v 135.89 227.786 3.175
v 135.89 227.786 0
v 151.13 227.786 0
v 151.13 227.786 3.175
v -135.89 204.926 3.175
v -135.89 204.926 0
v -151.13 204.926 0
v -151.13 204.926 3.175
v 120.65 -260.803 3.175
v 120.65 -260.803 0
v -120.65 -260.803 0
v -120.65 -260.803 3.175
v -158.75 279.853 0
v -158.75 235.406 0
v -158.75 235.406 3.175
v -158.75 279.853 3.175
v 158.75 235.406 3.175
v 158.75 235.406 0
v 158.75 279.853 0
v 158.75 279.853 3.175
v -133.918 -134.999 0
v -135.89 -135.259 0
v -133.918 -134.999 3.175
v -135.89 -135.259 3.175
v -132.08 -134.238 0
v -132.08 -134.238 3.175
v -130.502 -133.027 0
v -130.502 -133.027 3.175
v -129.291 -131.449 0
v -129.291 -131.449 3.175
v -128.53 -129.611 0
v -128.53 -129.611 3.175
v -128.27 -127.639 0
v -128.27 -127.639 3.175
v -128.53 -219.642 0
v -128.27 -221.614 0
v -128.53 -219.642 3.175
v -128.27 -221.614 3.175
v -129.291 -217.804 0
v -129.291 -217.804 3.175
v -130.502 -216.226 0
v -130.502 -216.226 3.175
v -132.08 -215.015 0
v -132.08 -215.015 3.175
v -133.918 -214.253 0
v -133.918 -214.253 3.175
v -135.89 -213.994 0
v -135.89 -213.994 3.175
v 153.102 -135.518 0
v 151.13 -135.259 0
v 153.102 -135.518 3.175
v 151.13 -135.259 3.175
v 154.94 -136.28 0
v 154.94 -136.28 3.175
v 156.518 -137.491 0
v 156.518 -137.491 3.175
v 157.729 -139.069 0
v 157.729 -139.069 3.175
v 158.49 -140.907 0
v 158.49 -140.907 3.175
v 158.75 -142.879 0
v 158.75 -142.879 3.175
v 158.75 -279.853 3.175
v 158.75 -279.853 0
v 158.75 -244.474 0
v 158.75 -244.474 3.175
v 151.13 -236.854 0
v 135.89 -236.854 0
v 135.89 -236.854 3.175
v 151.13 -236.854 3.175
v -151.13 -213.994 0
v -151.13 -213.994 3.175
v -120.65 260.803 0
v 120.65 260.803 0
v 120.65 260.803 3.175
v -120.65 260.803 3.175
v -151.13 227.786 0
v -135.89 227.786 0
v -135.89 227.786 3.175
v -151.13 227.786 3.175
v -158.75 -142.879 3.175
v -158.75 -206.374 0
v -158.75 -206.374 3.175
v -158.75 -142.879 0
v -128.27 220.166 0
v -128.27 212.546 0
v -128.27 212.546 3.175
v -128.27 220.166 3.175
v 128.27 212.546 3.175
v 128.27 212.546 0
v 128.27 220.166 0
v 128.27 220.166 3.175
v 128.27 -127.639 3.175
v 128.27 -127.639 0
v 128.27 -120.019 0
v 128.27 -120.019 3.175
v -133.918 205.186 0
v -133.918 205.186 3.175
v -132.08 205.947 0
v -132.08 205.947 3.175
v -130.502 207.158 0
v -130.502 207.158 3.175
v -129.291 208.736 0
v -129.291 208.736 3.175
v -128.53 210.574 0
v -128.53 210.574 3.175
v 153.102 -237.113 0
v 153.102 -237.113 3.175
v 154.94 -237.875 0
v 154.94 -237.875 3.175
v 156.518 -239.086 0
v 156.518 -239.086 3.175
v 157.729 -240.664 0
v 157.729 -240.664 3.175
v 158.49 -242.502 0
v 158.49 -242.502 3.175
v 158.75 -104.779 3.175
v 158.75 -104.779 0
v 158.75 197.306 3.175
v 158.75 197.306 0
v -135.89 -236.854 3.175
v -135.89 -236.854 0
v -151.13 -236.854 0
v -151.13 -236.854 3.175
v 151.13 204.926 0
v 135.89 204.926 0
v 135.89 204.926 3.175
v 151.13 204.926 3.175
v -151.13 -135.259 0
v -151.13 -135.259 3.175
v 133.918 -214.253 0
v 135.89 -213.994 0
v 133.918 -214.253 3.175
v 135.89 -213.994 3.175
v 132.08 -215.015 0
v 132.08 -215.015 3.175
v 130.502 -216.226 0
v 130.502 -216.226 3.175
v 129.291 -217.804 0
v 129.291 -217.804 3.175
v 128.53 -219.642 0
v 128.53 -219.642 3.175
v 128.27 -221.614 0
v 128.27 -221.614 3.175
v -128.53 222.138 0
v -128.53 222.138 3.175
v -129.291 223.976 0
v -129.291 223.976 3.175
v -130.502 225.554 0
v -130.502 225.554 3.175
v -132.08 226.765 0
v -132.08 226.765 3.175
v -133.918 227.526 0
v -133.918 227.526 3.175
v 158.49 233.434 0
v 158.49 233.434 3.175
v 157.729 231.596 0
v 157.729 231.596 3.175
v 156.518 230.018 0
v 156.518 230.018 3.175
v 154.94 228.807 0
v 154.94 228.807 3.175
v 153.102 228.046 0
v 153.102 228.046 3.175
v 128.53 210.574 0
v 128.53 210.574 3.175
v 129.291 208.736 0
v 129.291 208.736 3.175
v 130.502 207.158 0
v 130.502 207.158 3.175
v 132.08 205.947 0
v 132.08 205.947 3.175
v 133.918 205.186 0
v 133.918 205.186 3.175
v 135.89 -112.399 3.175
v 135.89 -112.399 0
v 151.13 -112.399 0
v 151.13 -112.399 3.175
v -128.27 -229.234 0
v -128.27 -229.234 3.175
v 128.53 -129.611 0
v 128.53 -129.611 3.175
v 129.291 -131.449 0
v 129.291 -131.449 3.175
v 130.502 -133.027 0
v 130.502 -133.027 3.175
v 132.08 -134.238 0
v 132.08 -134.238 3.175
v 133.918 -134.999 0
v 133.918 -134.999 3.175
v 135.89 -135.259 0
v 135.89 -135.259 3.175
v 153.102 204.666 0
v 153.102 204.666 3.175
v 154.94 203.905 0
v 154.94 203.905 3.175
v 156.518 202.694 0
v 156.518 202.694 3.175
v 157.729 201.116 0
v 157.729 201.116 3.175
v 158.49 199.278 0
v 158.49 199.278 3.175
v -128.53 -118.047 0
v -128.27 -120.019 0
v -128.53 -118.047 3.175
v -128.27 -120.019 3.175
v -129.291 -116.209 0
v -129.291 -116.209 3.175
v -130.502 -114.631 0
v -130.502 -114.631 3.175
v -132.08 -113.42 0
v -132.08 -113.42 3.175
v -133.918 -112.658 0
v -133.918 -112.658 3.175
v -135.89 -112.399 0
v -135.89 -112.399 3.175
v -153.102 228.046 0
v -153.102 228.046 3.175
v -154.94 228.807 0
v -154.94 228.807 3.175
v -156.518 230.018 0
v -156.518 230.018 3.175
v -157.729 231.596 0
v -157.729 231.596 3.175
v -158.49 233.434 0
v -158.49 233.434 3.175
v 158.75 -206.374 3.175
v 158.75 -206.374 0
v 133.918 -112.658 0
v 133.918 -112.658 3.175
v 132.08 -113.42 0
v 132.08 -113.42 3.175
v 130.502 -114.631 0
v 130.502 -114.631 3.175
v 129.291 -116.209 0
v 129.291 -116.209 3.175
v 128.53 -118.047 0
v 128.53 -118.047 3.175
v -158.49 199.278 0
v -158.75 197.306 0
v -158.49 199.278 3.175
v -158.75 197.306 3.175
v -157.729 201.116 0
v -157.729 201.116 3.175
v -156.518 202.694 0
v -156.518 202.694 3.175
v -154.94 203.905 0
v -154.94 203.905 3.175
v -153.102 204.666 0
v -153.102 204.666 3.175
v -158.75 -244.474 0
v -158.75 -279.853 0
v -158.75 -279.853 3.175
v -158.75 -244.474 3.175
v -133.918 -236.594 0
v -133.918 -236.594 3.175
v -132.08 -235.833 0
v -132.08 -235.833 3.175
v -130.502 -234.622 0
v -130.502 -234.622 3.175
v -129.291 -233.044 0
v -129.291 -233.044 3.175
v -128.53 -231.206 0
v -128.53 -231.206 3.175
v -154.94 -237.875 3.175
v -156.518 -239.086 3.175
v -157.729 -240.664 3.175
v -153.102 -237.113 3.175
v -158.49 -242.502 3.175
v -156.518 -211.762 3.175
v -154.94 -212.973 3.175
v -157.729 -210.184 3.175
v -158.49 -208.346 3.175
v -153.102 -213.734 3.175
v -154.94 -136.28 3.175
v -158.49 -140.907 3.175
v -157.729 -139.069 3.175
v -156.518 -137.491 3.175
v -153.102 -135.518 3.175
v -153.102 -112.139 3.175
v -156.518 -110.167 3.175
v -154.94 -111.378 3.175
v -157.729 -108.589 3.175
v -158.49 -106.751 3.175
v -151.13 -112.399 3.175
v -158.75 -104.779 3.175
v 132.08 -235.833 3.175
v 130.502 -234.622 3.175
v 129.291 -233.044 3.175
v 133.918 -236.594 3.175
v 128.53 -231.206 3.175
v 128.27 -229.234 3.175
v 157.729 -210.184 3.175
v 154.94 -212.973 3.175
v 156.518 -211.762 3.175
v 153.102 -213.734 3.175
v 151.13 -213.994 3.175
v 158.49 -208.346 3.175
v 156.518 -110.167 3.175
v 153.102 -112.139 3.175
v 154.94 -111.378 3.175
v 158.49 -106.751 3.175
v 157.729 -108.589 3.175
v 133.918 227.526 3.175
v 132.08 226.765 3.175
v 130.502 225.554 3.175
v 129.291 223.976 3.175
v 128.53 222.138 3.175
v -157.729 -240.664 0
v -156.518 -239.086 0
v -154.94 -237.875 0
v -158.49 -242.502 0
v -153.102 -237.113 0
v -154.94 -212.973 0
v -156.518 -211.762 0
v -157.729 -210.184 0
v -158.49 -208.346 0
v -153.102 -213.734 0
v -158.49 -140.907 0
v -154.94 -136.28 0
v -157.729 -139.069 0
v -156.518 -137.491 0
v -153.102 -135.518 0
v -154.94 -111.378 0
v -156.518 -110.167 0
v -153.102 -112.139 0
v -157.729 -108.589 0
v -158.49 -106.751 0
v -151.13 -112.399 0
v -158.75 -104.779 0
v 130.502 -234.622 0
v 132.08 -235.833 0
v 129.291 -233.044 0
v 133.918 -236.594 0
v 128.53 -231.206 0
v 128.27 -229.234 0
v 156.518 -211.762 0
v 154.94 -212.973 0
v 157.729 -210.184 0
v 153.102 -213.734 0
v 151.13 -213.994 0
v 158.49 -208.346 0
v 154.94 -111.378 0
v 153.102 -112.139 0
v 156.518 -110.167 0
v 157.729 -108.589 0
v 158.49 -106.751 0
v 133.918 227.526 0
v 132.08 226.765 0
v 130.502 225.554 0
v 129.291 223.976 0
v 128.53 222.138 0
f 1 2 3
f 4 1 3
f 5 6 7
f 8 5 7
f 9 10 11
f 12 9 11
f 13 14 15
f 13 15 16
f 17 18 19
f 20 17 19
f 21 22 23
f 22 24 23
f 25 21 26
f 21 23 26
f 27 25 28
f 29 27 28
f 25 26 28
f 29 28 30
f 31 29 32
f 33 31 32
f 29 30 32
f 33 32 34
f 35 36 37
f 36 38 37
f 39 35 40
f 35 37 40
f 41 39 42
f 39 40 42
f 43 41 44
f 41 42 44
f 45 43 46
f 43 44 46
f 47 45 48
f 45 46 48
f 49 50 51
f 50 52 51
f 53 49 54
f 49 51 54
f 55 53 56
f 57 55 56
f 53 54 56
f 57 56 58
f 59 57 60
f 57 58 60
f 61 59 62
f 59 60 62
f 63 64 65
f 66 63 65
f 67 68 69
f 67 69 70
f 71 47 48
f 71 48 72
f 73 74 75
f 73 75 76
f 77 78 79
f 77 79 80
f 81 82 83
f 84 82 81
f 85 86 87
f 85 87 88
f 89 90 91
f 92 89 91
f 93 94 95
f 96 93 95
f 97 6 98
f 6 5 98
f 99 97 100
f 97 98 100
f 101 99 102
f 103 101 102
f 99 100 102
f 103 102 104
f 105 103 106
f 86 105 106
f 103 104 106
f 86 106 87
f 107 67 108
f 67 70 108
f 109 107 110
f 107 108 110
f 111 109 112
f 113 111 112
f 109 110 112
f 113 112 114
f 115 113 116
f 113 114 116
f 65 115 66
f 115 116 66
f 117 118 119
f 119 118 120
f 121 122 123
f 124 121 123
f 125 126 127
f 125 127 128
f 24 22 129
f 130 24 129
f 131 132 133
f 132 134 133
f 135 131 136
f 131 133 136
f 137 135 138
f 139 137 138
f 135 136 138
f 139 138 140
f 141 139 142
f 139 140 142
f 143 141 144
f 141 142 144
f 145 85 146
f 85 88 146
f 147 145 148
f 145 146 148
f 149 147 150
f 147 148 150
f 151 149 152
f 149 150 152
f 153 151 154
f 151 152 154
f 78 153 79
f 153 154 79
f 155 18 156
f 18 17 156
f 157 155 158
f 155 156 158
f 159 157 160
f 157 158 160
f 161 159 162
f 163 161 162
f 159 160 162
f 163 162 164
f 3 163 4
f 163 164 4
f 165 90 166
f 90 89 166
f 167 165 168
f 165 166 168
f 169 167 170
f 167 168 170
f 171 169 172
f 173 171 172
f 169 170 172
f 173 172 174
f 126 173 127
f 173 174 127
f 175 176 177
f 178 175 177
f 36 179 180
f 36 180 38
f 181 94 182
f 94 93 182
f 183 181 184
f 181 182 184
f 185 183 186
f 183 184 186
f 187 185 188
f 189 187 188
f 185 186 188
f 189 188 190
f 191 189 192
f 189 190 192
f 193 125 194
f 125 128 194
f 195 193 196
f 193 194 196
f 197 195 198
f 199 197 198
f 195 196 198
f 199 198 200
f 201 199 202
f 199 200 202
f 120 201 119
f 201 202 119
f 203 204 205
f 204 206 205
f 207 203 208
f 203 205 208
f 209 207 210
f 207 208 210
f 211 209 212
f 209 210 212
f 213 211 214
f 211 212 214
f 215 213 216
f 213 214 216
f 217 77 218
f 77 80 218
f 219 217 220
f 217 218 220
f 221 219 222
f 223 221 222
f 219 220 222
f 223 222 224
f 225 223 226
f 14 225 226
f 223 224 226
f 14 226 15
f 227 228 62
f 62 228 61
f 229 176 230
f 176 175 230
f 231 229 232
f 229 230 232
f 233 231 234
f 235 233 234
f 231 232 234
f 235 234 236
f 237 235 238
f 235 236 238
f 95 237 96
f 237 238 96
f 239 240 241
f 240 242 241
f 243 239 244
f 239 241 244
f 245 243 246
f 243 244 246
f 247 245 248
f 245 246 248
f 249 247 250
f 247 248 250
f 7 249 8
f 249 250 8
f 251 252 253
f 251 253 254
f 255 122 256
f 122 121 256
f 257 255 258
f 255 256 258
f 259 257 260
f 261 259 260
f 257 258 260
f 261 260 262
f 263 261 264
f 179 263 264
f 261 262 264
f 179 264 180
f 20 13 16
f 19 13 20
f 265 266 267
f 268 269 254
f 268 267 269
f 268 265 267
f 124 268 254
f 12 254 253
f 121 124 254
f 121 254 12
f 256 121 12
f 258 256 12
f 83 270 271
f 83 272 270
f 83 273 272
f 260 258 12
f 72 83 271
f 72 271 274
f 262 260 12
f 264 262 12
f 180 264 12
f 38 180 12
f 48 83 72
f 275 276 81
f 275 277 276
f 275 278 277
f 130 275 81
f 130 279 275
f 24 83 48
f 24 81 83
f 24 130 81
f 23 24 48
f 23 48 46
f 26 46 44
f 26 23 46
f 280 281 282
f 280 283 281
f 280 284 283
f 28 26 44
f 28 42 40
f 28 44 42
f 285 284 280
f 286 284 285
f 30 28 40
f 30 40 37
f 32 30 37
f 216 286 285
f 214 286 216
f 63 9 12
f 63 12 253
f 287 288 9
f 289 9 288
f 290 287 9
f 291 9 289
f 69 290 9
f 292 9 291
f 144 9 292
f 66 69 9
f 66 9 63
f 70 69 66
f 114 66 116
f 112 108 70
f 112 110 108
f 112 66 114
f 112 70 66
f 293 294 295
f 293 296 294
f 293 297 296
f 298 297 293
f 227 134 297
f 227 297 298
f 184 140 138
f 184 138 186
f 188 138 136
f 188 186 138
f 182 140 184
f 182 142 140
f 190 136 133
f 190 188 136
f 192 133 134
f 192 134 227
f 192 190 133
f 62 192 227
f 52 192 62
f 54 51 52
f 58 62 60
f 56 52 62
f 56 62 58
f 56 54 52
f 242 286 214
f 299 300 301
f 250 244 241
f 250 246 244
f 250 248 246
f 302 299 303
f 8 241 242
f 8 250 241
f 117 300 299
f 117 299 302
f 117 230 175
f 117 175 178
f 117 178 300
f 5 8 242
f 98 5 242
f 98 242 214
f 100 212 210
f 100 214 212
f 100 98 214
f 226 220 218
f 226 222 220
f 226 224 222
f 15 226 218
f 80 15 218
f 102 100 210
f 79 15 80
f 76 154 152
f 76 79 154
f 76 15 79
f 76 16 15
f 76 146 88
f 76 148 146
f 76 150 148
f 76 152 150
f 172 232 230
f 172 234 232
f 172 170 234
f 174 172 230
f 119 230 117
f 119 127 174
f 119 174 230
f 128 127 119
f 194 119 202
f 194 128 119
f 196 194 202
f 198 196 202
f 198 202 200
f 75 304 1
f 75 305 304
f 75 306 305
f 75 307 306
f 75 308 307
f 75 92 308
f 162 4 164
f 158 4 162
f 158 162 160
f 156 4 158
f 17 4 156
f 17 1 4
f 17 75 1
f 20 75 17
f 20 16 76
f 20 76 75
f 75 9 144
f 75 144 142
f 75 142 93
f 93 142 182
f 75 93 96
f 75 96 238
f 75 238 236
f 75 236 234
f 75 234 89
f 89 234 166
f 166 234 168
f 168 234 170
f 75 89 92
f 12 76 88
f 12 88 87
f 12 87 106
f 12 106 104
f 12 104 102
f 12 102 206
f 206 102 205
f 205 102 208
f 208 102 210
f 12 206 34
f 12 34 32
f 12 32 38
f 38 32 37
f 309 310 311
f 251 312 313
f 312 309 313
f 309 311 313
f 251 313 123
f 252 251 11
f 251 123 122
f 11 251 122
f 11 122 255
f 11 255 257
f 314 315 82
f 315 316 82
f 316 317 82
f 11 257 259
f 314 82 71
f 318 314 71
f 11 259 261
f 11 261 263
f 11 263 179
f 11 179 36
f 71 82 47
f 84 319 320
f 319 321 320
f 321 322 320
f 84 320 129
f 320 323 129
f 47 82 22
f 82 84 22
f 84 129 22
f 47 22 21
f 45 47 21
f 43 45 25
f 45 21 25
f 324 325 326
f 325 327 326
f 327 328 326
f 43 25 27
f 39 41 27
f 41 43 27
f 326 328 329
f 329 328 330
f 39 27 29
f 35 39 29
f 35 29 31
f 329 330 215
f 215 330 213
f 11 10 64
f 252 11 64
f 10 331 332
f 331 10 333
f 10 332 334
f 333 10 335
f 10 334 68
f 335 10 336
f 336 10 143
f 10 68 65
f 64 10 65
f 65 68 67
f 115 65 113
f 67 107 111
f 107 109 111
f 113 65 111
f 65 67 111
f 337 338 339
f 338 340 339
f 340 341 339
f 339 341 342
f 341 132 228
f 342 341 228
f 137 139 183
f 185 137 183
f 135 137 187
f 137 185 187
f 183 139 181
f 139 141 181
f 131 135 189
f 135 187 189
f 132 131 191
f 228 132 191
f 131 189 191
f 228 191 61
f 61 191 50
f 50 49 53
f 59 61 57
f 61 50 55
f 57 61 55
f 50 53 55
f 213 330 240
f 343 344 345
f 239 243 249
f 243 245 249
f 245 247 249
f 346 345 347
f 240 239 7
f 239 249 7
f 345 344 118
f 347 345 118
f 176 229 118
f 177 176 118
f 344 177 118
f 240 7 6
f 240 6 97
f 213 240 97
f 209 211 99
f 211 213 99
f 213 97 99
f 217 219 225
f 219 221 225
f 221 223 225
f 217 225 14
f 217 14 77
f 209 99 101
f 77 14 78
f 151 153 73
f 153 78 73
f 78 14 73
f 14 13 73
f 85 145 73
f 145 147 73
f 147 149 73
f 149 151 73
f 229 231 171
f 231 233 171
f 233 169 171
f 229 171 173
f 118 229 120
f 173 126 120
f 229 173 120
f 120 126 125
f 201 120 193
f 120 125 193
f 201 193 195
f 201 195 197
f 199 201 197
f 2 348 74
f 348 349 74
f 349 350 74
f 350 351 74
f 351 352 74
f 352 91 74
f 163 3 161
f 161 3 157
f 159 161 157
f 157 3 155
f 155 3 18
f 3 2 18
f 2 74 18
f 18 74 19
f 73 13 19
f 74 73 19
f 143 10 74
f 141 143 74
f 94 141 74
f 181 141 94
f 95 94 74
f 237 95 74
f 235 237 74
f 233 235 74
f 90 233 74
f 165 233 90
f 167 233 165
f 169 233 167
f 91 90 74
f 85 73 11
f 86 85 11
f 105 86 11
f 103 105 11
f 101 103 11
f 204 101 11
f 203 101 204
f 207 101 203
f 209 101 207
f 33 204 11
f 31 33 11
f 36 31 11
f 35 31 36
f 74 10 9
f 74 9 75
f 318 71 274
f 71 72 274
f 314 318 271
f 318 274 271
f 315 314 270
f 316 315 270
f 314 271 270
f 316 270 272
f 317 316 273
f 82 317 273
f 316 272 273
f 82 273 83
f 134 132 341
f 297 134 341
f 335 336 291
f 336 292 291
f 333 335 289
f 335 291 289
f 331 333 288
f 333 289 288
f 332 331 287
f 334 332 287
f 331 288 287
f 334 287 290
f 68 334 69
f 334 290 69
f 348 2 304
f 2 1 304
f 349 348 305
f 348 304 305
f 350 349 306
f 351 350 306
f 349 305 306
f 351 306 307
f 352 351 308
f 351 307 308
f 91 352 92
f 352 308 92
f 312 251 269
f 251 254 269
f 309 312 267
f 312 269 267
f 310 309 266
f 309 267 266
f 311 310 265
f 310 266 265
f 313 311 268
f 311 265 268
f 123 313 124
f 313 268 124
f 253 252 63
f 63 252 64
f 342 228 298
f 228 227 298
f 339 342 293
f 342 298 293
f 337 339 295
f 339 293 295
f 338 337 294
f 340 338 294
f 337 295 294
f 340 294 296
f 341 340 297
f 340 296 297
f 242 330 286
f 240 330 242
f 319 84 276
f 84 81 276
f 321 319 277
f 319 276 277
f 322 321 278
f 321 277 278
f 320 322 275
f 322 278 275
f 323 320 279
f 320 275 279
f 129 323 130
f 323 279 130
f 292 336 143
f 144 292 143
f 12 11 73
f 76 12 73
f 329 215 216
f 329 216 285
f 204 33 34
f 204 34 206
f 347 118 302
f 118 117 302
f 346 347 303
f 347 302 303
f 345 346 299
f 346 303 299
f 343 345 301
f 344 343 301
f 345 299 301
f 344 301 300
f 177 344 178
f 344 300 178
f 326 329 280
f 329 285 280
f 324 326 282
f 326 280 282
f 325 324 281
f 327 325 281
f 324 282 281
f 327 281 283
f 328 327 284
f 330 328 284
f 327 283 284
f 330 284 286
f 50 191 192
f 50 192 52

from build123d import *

# Parameters (mm, degrees)
SKETCH1_W           = 317.5
SKETCH1_H           = 559.70678
BOSS_EXTRUDE1_DEPTH = 3.175
SKETCH5_W           = 30.48
SKETCH5_H           = 22.86
CUT_EXTRUDE1_DEPTH  = 322.760101659
FILLET1_R           = 7.62
SKETCH5_3_W         = 241.3
SKETCH5_3_H         = 521.60678
CUT_EXTRUDE2_DEPTH  = 322.760101659


with BuildPart() as part:
    # Sketch1 → Boss-Extrude1 (new body)
    with BuildSketch(Plane.XY):
        Rectangle(SKETCH1_W, SKETCH1_H)
    extrude(amount=BOSS_EXTRUDE1_DEPTH)

    # Sketch5 → Cut-Extrude1 (cut, through all)
    with BuildSketch(Plane(origin=(0, 0, 0), x_dir=(-1, 0, 0), z_dir=(0, 0, -1))):
        with Locations((143.51, 216.35593)):
            Rectangle(SKETCH5_W, SKETCH5_H)
        with Locations((143.51, -123.82881)):
            Rectangle(SKETCH5_W, SKETCH5_H)
        with Locations((143.51, -225.42373)):
            Rectangle(SKETCH5_W, SKETCH5_H)
    cut_extrude1 = extrude(amount=-CUT_EXTRUDE1_DEPTH, mode=Mode.SUBTRACT)

    # Mirror1: Cut-Extrude1 across plane
    add(cut_extrude1.mirror(Plane(origin=(0, 0, 0), x_dir=(0, 0, 1), z_dir=(1, 0, 0))), mode=Mode.SUBTRACT)

    # Fillet1
    fillet1_edges = [part.edges().sort_by_distance(p)[0] for p in [
        (-128.27, 227.78593, 1.5875),
        (-158.75, 227.78593, 1.5875),
        (-158.75, 204.92593, 1.5875),
        (-128.27, 204.92593, 1.5875),
        (-128.27, -135.25881, 1.5875),
        (-128.27, -112.39881, 1.5875),
        (-158.75, -112.39881, 1.5875),
        (-158.75, -135.25881, 1.5875),
        (-128.27, -236.85373, 1.5875),
        (-128.27, -213.99373, 1.5875),
        (-158.75, -213.99373, 1.5875),
        (-158.75, -236.85373, 1.5875),
        (158.75, 227.78593, 1.5875),
        (128.27, 227.78593, 1.5875),
        (128.27, 204.92593, 1.5875),
        (158.75, 204.92593, 1.5875),
        (128.27, -112.39881, 1.5875),
        (128.27, -135.25881, 1.5875),
        (158.75, -135.25881, 1.5875),
        (158.75, -112.39881, 1.5875),
        (128.27, -213.99373, 1.5875),
        (128.27, -236.85373, 1.5875),
        (158.75, -236.85373, 1.5875),
        (158.75, -213.99373, 1.5875),
    ]]
    fillet(fillet1_edges, radius=FILLET1_R)

    # Sketch5<3> → Cut-Extrude2 (cut, through all)
    with BuildSketch(Plane(origin=(0, 0, 0), x_dir=(-1, 0, 0), z_dir=(0, 0, -1))):
        Rectangle(SKETCH5_3_W, SKETCH5_3_H)
    extrude(amount=-CUT_EXTRUDE2_DEPTH, mode=Mode.SUBTRACT)


solid = part.part
